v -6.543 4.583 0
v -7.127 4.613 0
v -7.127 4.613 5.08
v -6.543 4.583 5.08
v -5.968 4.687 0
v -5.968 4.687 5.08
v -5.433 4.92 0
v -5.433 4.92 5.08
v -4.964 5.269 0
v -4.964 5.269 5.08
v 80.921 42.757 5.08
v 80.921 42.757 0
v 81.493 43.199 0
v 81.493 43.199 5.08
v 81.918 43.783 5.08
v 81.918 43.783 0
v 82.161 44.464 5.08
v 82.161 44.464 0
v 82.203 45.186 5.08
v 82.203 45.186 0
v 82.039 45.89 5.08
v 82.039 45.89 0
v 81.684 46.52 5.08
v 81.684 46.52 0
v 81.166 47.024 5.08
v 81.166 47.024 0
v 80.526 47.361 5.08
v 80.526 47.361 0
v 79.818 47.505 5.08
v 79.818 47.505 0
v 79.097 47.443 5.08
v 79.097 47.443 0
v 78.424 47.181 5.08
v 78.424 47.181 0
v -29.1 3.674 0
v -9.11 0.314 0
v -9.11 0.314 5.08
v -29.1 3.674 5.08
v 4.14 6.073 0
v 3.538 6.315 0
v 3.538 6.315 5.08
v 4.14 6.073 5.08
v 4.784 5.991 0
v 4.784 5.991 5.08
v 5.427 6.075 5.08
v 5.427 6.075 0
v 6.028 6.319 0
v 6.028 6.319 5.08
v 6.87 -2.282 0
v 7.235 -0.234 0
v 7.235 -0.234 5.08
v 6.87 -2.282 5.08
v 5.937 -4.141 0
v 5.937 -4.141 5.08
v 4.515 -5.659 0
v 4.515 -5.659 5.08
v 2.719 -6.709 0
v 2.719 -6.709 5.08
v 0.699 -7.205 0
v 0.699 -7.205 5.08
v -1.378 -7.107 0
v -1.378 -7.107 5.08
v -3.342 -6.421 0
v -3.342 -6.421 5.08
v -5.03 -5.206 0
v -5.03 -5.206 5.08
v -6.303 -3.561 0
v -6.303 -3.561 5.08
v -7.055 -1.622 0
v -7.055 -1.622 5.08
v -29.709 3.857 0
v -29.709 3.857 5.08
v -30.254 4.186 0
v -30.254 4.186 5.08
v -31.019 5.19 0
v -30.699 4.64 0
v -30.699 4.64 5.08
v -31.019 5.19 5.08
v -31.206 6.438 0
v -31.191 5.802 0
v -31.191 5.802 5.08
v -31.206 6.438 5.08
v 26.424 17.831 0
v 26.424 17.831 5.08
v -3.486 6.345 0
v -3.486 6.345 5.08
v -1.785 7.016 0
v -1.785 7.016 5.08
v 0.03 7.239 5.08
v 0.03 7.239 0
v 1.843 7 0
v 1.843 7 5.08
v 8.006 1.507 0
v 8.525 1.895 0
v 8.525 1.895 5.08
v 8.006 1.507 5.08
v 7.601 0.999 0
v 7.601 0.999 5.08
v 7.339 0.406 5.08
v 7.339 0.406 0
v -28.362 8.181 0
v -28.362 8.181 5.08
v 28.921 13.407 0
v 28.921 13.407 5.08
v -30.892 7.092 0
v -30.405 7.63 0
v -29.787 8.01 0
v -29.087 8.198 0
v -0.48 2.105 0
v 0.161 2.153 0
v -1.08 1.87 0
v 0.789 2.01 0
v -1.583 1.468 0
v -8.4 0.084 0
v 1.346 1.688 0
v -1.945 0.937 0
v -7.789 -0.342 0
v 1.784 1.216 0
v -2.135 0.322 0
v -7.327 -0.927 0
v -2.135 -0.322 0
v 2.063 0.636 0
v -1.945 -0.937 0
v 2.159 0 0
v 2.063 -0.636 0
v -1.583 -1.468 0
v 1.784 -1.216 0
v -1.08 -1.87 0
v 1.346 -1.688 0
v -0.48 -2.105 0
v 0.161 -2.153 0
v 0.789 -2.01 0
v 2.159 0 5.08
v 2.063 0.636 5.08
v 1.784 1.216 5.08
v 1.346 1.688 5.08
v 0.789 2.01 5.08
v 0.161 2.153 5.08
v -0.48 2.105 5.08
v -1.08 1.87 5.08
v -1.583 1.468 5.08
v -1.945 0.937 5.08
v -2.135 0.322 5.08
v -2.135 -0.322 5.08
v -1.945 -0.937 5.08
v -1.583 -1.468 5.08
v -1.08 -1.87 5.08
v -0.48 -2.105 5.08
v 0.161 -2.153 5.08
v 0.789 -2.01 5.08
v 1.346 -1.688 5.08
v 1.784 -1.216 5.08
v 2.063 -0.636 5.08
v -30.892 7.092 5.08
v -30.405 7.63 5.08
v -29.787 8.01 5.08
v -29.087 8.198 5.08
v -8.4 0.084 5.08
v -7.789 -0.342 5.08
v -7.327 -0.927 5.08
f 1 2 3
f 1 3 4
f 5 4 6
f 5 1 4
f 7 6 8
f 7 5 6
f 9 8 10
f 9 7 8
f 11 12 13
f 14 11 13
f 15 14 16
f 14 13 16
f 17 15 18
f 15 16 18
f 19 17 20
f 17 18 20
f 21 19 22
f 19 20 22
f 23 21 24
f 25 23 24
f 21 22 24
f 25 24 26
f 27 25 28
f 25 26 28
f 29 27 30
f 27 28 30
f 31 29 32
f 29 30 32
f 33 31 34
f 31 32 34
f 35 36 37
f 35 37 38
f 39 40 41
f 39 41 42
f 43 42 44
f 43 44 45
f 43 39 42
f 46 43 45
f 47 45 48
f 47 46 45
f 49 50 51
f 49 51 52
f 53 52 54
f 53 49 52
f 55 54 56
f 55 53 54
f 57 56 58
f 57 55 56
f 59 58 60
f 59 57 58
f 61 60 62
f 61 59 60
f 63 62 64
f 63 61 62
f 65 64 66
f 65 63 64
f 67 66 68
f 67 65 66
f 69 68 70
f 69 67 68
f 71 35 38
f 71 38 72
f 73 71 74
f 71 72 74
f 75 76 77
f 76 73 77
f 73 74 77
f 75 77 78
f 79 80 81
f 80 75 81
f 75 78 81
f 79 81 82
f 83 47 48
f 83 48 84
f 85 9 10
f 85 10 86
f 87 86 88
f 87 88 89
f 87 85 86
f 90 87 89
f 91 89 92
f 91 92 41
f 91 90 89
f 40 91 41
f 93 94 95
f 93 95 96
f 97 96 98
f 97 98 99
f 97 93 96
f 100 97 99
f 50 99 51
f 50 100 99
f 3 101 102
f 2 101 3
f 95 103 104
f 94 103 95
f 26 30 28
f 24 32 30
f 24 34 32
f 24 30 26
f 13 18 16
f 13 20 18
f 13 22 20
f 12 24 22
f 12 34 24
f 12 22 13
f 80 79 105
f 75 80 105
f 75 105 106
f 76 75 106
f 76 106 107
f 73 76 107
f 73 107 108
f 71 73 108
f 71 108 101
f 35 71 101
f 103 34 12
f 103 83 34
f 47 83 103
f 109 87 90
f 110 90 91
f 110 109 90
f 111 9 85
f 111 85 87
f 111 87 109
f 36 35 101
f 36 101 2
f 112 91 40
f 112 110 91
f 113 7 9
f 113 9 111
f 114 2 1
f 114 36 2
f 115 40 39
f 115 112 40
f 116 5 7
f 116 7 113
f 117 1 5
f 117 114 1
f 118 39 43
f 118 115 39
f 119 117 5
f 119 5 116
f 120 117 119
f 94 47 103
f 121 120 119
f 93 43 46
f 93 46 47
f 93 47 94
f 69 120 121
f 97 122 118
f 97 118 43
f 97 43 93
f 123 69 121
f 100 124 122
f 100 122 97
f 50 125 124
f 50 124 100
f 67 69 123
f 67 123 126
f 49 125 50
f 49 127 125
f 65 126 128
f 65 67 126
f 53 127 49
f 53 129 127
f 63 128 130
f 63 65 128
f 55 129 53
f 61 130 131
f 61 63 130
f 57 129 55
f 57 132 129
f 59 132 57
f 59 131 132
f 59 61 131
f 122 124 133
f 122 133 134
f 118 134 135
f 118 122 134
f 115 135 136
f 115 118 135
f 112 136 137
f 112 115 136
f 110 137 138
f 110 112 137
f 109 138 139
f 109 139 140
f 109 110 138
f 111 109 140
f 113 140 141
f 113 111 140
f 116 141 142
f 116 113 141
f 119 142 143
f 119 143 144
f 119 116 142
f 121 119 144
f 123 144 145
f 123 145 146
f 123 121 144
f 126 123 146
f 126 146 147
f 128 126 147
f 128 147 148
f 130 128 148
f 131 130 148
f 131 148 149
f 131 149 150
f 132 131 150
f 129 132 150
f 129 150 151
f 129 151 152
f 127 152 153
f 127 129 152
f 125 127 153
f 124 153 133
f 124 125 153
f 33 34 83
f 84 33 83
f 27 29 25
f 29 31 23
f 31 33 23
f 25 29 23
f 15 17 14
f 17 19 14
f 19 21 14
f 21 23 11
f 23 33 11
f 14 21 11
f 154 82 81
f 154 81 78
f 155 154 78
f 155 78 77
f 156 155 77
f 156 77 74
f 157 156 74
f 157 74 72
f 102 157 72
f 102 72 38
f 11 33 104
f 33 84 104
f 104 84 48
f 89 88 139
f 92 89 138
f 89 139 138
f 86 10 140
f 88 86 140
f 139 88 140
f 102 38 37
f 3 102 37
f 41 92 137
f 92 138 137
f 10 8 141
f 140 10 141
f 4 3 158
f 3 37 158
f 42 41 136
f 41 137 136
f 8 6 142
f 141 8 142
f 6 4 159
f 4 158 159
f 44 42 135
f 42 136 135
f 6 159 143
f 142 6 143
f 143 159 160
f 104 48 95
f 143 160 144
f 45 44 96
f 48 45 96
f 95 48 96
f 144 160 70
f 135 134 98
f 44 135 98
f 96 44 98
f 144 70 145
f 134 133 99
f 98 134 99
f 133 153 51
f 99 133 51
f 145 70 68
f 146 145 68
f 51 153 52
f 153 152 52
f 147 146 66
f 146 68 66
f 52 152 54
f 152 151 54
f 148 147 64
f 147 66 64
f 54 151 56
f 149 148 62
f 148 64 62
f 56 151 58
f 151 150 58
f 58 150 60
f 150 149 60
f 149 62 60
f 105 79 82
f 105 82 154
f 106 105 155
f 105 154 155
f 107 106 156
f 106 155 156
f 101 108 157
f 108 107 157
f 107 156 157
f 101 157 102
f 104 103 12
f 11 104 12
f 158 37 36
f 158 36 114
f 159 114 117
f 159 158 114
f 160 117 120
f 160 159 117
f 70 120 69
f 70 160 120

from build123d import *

# Parameters (mm, degrees)
SKETCH1_R               = 31.877
SKETCH1_R_2             = 2.159
BOSS_EXTRUDE1_DEPTH     = 5.08
BOSS_EXTRUDE4_START     = -5.08
BOSS_EXTRUDE4_DEPTH     = 5.08
CUT_EXTRUDE1_DEPTH      = 96.088150113
CUT_EXTRUDE1_DEPTH_BACK = 96.088150113
FILLET1_R               = 2.54


with BuildPart() as part:
    # Sketch1 → Boss-Extrude1 (new body)
    with BuildSketch(Plane.XY):
        Circle(SKETCH1_R)
        Circle(SKETCH1_R_2, mode=Mode.SUBTRACT)
        with BuildLine():
            ThreePointArc((19.487155783, 19.487155783), (-5.258505104, 27.052663549), (-25.368193256, 10.76815917))
            ThreePointArc((-25.368193256, 10.76815917), (-24.224411784, 7.937200685), (-21.393453299, 9.080982157))
            ThreePointArc((-21.393453299, 9.080982157), (-4.434591862, 22.813997371), (16.433868702, 16.433868702))
            ThreePointArc((16.433868702, 16.433868702), (19.487155783, 16.433868702), (19.487155783, 19.487155783))
        make_face(mode=Mode.SUBTRACT)
    extrude(amount=BOSS_EXTRUDE1_DEPTH)

    # Sketch2 → Boss-Extrude4 (add)
    with BuildSketch(Plane.XY.offset(5.08).offset(BOSS_EXTRUDE4_START)):
        with BuildLine():
            ThreePointArc((26.423537131, 17.830866902), (27.113483126, 16.763119094), (27.760306855, 15.668710614))
            ThreePointArc((27.760306855, 15.668710614), (28.362979586, 14.549382048), (28.920542807, 13.406913618))
            Line((28.920542807, 13.406913618), (80.920581905, 42.757221913))
            ThreePointArc((80.920581905, 42.757221913), (81.884055709, 46.217701392), (78.423576229, 47.181175196))
            Line((78.423576229, 47.181175196), (26.423537131, 17.830866902))
        make_face()
    extrude(amount=BOSS_EXTRUDE4_DEPTH)

    # Sketch6 → Cut-Extrude1 (cut, two sides: drawn at the far end of the back side and taken through both)
    # profile 1 of 2: a face of its own
    with BuildSketch(Plane.XY.offset(5.08).offset(-CUT_EXTRUDE1_DEPTH_BACK)):
        with BuildLine():
            ThreePointArc((7.239, 0), (0, -7.239), (-7.239, 0))
            Line((-7.239, 0), (-31.612710273, 4.096300546))
            ThreePointArc((-31.612710273, 4.096300546), (4.846010768, -31.506496293), (28.920542807, 13.406913618))
            Line((28.920542807, 13.406913618), (7.151828818, 1.120029266))
            ThreePointArc((7.151828818, 1.120029266), (7.217174302, 0.561708192), (7.239, 0))
        make_face()
    # profile 2 of 2: a face of its own
    with BuildSketch(Plane.XY.offset(5.08).offset(-CUT_EXTRUDE1_DEPTH_BACK)):
        with BuildLine():
            Line((-30.702053839, 8.574789739), (-5.761160237, 4.383167088))
            ThreePointArc((-5.761160237, 4.383167088), (-0.801790855, 7.194459842), (4.654823143, 5.54398255))
            Line((4.654823143, 5.54398255), (26.423537131, 17.830866902))
            ThreePointArc((26.423537131, 17.830866902), (-5.098545618, 31.466616621), (-30.702053839, 8.574789739))
        make_face()
        with BuildLine():
            ThreePointArc((-21.393453299, 9.080982157), (-24.224411784, 7.937200685), (-25.368193256, 10.76815917))
            ThreePointArc((-25.368193256, 10.76815917), (-5.258505104, 27.052663549), (19.487155783, 19.487155783))
            ThreePointArc((19.487155783, 19.487155783), (19.487155783, 16.433868702), (16.433868702, 16.433868702))
            ThreePointArc((16.433868702, 16.433868702), (-4.434591862, 22.813997371), (-21.393453299, 9.080982157))
        make_face(mode=Mode.SUBTRACT)
    extrude(amount=CUT_EXTRUDE1_DEPTH + CUT_EXTRUDE1_DEPTH_BACK, mode=Mode.SUBTRACT)

    # Fillet1
    # the kernel refuses this fillet: 2.54 mm, written as the material it adds along each edge
    with BuildSketch(Plane(origin=(7.151828818, 1.120029266, 0), x_dir=(0.8708569456123161, 0.49153655029792803, 0), z_dir=(0, 0, 1))) as fillet1_piece_1:
        with BuildLine():
            CenterArc((1.577227226, -2.54), FILLET1_R, 90, 58.70258778)
            ThreePointArc((-0.593157799, -1.220519481), (-0.267916042, -0.624189545), (0, 0))
            Line((0, 0), (1.577227226, 0))
        make_face()
    extrude(amount=5.08)
    with BuildSketch(Plane(origin=(-7.239, 0, 5.08), x_dir=(0.11271886677940961, -0.9936269204646005, 0), z_dir=(0, 0, -1))) as fillet1_piece_2:
        with BuildLine():
            CenterArc((1.918249675, 2.523812378), FILLET1_R, 196.012174579, 67.515755227)
            Line((-0.523206212, 1.823174702), (0, 0))
            ThreePointArc((0, 0), (0.815971877, 0.046134723), (1.631943753, 0))
        make_face()
    extrude(amount=5.08)
    with BuildSketch(Plane(origin=(-5.761160237, 4.383167088, 0), x_dir=(-0.9861698342812768, 0.1657379194802423, 0), z_dir=(0, 0, 1))) as fillet1_piece_3:
        with BuildLine():
            CenterArc((1.384869379, -2.54), FILLET1_R, 90, 52.834345642)
            ThreePointArc((-0.639236805, -1.005531312), (-0.298894804, -0.515940071), (0, 0))
            Line((0, 0), (1.384869379, 0))
        make_face()
    extrude(amount=5.08)
    with BuildSketch(Plane(origin=(4.654823143, 5.54398255, 0), x_dir=(-0.822747868924725, 0.5684064955468259, 0), z_dir=(0, 0, 1))) as fillet1_piece_4:
        with BuildLine():
            CenterArc((1.595093986, -2.528818084), FILLET1_R, 95.378217341, 58.70258778)
            Line((-0.689410954, -1.418576138), (0, 0))
            ThreePointArc((0, 0), (0.678510128, -0.031868462), (1.357020257, 0))
        make_face()
    extrude(amount=5.08)
    # the kernel refuses this fillet: 2.54 mm, written as the material it takes off along each edge
    with BuildSketch(Plane(origin=(-31.612710273, 4.096300546, 11.72014543), x_dir=(0.16970739547813604, 0.9854944951241623, 0), z_dir=(0, 0, -1))) as fillet1_2_piece_1:
        with BuildLine():
            CenterArc((2.550239121, 2.537794777), FILLET1_R, 179.769297531, 92.618395473)
            Line((0.010259711, 2.548022104), (0, 0))
            ThreePointArc((0, 0), (1.328029086, -0.027675553), (2.656058172, 0))
        make_face()
    extrude(amount=18.360290859, mode=Mode.SUBTRACT)
    with BuildSketch(Plane(origin=(-30.702053839, 8.574789739, 11.264732426), x_dir=(-0.23142006646754307, -0.9728539216327177, 0), z_dir=(0, 0, -1))) as fillet1_2_piece_2:
        with BuildLine():
            CenterArc((2.375331497, -2.538087003), FILLET1_R, 87.776151747, 88.383261221)
            Line((-0.158964351, -2.367956016), (0, 0))
            ThreePointArc((0, 0), (1.236946485, 0.024008109), (2.47389297, 0))
        make_face()
    extrude(amount=17.449464851, mode=Mode.SUBTRACT)


solid = part.part
